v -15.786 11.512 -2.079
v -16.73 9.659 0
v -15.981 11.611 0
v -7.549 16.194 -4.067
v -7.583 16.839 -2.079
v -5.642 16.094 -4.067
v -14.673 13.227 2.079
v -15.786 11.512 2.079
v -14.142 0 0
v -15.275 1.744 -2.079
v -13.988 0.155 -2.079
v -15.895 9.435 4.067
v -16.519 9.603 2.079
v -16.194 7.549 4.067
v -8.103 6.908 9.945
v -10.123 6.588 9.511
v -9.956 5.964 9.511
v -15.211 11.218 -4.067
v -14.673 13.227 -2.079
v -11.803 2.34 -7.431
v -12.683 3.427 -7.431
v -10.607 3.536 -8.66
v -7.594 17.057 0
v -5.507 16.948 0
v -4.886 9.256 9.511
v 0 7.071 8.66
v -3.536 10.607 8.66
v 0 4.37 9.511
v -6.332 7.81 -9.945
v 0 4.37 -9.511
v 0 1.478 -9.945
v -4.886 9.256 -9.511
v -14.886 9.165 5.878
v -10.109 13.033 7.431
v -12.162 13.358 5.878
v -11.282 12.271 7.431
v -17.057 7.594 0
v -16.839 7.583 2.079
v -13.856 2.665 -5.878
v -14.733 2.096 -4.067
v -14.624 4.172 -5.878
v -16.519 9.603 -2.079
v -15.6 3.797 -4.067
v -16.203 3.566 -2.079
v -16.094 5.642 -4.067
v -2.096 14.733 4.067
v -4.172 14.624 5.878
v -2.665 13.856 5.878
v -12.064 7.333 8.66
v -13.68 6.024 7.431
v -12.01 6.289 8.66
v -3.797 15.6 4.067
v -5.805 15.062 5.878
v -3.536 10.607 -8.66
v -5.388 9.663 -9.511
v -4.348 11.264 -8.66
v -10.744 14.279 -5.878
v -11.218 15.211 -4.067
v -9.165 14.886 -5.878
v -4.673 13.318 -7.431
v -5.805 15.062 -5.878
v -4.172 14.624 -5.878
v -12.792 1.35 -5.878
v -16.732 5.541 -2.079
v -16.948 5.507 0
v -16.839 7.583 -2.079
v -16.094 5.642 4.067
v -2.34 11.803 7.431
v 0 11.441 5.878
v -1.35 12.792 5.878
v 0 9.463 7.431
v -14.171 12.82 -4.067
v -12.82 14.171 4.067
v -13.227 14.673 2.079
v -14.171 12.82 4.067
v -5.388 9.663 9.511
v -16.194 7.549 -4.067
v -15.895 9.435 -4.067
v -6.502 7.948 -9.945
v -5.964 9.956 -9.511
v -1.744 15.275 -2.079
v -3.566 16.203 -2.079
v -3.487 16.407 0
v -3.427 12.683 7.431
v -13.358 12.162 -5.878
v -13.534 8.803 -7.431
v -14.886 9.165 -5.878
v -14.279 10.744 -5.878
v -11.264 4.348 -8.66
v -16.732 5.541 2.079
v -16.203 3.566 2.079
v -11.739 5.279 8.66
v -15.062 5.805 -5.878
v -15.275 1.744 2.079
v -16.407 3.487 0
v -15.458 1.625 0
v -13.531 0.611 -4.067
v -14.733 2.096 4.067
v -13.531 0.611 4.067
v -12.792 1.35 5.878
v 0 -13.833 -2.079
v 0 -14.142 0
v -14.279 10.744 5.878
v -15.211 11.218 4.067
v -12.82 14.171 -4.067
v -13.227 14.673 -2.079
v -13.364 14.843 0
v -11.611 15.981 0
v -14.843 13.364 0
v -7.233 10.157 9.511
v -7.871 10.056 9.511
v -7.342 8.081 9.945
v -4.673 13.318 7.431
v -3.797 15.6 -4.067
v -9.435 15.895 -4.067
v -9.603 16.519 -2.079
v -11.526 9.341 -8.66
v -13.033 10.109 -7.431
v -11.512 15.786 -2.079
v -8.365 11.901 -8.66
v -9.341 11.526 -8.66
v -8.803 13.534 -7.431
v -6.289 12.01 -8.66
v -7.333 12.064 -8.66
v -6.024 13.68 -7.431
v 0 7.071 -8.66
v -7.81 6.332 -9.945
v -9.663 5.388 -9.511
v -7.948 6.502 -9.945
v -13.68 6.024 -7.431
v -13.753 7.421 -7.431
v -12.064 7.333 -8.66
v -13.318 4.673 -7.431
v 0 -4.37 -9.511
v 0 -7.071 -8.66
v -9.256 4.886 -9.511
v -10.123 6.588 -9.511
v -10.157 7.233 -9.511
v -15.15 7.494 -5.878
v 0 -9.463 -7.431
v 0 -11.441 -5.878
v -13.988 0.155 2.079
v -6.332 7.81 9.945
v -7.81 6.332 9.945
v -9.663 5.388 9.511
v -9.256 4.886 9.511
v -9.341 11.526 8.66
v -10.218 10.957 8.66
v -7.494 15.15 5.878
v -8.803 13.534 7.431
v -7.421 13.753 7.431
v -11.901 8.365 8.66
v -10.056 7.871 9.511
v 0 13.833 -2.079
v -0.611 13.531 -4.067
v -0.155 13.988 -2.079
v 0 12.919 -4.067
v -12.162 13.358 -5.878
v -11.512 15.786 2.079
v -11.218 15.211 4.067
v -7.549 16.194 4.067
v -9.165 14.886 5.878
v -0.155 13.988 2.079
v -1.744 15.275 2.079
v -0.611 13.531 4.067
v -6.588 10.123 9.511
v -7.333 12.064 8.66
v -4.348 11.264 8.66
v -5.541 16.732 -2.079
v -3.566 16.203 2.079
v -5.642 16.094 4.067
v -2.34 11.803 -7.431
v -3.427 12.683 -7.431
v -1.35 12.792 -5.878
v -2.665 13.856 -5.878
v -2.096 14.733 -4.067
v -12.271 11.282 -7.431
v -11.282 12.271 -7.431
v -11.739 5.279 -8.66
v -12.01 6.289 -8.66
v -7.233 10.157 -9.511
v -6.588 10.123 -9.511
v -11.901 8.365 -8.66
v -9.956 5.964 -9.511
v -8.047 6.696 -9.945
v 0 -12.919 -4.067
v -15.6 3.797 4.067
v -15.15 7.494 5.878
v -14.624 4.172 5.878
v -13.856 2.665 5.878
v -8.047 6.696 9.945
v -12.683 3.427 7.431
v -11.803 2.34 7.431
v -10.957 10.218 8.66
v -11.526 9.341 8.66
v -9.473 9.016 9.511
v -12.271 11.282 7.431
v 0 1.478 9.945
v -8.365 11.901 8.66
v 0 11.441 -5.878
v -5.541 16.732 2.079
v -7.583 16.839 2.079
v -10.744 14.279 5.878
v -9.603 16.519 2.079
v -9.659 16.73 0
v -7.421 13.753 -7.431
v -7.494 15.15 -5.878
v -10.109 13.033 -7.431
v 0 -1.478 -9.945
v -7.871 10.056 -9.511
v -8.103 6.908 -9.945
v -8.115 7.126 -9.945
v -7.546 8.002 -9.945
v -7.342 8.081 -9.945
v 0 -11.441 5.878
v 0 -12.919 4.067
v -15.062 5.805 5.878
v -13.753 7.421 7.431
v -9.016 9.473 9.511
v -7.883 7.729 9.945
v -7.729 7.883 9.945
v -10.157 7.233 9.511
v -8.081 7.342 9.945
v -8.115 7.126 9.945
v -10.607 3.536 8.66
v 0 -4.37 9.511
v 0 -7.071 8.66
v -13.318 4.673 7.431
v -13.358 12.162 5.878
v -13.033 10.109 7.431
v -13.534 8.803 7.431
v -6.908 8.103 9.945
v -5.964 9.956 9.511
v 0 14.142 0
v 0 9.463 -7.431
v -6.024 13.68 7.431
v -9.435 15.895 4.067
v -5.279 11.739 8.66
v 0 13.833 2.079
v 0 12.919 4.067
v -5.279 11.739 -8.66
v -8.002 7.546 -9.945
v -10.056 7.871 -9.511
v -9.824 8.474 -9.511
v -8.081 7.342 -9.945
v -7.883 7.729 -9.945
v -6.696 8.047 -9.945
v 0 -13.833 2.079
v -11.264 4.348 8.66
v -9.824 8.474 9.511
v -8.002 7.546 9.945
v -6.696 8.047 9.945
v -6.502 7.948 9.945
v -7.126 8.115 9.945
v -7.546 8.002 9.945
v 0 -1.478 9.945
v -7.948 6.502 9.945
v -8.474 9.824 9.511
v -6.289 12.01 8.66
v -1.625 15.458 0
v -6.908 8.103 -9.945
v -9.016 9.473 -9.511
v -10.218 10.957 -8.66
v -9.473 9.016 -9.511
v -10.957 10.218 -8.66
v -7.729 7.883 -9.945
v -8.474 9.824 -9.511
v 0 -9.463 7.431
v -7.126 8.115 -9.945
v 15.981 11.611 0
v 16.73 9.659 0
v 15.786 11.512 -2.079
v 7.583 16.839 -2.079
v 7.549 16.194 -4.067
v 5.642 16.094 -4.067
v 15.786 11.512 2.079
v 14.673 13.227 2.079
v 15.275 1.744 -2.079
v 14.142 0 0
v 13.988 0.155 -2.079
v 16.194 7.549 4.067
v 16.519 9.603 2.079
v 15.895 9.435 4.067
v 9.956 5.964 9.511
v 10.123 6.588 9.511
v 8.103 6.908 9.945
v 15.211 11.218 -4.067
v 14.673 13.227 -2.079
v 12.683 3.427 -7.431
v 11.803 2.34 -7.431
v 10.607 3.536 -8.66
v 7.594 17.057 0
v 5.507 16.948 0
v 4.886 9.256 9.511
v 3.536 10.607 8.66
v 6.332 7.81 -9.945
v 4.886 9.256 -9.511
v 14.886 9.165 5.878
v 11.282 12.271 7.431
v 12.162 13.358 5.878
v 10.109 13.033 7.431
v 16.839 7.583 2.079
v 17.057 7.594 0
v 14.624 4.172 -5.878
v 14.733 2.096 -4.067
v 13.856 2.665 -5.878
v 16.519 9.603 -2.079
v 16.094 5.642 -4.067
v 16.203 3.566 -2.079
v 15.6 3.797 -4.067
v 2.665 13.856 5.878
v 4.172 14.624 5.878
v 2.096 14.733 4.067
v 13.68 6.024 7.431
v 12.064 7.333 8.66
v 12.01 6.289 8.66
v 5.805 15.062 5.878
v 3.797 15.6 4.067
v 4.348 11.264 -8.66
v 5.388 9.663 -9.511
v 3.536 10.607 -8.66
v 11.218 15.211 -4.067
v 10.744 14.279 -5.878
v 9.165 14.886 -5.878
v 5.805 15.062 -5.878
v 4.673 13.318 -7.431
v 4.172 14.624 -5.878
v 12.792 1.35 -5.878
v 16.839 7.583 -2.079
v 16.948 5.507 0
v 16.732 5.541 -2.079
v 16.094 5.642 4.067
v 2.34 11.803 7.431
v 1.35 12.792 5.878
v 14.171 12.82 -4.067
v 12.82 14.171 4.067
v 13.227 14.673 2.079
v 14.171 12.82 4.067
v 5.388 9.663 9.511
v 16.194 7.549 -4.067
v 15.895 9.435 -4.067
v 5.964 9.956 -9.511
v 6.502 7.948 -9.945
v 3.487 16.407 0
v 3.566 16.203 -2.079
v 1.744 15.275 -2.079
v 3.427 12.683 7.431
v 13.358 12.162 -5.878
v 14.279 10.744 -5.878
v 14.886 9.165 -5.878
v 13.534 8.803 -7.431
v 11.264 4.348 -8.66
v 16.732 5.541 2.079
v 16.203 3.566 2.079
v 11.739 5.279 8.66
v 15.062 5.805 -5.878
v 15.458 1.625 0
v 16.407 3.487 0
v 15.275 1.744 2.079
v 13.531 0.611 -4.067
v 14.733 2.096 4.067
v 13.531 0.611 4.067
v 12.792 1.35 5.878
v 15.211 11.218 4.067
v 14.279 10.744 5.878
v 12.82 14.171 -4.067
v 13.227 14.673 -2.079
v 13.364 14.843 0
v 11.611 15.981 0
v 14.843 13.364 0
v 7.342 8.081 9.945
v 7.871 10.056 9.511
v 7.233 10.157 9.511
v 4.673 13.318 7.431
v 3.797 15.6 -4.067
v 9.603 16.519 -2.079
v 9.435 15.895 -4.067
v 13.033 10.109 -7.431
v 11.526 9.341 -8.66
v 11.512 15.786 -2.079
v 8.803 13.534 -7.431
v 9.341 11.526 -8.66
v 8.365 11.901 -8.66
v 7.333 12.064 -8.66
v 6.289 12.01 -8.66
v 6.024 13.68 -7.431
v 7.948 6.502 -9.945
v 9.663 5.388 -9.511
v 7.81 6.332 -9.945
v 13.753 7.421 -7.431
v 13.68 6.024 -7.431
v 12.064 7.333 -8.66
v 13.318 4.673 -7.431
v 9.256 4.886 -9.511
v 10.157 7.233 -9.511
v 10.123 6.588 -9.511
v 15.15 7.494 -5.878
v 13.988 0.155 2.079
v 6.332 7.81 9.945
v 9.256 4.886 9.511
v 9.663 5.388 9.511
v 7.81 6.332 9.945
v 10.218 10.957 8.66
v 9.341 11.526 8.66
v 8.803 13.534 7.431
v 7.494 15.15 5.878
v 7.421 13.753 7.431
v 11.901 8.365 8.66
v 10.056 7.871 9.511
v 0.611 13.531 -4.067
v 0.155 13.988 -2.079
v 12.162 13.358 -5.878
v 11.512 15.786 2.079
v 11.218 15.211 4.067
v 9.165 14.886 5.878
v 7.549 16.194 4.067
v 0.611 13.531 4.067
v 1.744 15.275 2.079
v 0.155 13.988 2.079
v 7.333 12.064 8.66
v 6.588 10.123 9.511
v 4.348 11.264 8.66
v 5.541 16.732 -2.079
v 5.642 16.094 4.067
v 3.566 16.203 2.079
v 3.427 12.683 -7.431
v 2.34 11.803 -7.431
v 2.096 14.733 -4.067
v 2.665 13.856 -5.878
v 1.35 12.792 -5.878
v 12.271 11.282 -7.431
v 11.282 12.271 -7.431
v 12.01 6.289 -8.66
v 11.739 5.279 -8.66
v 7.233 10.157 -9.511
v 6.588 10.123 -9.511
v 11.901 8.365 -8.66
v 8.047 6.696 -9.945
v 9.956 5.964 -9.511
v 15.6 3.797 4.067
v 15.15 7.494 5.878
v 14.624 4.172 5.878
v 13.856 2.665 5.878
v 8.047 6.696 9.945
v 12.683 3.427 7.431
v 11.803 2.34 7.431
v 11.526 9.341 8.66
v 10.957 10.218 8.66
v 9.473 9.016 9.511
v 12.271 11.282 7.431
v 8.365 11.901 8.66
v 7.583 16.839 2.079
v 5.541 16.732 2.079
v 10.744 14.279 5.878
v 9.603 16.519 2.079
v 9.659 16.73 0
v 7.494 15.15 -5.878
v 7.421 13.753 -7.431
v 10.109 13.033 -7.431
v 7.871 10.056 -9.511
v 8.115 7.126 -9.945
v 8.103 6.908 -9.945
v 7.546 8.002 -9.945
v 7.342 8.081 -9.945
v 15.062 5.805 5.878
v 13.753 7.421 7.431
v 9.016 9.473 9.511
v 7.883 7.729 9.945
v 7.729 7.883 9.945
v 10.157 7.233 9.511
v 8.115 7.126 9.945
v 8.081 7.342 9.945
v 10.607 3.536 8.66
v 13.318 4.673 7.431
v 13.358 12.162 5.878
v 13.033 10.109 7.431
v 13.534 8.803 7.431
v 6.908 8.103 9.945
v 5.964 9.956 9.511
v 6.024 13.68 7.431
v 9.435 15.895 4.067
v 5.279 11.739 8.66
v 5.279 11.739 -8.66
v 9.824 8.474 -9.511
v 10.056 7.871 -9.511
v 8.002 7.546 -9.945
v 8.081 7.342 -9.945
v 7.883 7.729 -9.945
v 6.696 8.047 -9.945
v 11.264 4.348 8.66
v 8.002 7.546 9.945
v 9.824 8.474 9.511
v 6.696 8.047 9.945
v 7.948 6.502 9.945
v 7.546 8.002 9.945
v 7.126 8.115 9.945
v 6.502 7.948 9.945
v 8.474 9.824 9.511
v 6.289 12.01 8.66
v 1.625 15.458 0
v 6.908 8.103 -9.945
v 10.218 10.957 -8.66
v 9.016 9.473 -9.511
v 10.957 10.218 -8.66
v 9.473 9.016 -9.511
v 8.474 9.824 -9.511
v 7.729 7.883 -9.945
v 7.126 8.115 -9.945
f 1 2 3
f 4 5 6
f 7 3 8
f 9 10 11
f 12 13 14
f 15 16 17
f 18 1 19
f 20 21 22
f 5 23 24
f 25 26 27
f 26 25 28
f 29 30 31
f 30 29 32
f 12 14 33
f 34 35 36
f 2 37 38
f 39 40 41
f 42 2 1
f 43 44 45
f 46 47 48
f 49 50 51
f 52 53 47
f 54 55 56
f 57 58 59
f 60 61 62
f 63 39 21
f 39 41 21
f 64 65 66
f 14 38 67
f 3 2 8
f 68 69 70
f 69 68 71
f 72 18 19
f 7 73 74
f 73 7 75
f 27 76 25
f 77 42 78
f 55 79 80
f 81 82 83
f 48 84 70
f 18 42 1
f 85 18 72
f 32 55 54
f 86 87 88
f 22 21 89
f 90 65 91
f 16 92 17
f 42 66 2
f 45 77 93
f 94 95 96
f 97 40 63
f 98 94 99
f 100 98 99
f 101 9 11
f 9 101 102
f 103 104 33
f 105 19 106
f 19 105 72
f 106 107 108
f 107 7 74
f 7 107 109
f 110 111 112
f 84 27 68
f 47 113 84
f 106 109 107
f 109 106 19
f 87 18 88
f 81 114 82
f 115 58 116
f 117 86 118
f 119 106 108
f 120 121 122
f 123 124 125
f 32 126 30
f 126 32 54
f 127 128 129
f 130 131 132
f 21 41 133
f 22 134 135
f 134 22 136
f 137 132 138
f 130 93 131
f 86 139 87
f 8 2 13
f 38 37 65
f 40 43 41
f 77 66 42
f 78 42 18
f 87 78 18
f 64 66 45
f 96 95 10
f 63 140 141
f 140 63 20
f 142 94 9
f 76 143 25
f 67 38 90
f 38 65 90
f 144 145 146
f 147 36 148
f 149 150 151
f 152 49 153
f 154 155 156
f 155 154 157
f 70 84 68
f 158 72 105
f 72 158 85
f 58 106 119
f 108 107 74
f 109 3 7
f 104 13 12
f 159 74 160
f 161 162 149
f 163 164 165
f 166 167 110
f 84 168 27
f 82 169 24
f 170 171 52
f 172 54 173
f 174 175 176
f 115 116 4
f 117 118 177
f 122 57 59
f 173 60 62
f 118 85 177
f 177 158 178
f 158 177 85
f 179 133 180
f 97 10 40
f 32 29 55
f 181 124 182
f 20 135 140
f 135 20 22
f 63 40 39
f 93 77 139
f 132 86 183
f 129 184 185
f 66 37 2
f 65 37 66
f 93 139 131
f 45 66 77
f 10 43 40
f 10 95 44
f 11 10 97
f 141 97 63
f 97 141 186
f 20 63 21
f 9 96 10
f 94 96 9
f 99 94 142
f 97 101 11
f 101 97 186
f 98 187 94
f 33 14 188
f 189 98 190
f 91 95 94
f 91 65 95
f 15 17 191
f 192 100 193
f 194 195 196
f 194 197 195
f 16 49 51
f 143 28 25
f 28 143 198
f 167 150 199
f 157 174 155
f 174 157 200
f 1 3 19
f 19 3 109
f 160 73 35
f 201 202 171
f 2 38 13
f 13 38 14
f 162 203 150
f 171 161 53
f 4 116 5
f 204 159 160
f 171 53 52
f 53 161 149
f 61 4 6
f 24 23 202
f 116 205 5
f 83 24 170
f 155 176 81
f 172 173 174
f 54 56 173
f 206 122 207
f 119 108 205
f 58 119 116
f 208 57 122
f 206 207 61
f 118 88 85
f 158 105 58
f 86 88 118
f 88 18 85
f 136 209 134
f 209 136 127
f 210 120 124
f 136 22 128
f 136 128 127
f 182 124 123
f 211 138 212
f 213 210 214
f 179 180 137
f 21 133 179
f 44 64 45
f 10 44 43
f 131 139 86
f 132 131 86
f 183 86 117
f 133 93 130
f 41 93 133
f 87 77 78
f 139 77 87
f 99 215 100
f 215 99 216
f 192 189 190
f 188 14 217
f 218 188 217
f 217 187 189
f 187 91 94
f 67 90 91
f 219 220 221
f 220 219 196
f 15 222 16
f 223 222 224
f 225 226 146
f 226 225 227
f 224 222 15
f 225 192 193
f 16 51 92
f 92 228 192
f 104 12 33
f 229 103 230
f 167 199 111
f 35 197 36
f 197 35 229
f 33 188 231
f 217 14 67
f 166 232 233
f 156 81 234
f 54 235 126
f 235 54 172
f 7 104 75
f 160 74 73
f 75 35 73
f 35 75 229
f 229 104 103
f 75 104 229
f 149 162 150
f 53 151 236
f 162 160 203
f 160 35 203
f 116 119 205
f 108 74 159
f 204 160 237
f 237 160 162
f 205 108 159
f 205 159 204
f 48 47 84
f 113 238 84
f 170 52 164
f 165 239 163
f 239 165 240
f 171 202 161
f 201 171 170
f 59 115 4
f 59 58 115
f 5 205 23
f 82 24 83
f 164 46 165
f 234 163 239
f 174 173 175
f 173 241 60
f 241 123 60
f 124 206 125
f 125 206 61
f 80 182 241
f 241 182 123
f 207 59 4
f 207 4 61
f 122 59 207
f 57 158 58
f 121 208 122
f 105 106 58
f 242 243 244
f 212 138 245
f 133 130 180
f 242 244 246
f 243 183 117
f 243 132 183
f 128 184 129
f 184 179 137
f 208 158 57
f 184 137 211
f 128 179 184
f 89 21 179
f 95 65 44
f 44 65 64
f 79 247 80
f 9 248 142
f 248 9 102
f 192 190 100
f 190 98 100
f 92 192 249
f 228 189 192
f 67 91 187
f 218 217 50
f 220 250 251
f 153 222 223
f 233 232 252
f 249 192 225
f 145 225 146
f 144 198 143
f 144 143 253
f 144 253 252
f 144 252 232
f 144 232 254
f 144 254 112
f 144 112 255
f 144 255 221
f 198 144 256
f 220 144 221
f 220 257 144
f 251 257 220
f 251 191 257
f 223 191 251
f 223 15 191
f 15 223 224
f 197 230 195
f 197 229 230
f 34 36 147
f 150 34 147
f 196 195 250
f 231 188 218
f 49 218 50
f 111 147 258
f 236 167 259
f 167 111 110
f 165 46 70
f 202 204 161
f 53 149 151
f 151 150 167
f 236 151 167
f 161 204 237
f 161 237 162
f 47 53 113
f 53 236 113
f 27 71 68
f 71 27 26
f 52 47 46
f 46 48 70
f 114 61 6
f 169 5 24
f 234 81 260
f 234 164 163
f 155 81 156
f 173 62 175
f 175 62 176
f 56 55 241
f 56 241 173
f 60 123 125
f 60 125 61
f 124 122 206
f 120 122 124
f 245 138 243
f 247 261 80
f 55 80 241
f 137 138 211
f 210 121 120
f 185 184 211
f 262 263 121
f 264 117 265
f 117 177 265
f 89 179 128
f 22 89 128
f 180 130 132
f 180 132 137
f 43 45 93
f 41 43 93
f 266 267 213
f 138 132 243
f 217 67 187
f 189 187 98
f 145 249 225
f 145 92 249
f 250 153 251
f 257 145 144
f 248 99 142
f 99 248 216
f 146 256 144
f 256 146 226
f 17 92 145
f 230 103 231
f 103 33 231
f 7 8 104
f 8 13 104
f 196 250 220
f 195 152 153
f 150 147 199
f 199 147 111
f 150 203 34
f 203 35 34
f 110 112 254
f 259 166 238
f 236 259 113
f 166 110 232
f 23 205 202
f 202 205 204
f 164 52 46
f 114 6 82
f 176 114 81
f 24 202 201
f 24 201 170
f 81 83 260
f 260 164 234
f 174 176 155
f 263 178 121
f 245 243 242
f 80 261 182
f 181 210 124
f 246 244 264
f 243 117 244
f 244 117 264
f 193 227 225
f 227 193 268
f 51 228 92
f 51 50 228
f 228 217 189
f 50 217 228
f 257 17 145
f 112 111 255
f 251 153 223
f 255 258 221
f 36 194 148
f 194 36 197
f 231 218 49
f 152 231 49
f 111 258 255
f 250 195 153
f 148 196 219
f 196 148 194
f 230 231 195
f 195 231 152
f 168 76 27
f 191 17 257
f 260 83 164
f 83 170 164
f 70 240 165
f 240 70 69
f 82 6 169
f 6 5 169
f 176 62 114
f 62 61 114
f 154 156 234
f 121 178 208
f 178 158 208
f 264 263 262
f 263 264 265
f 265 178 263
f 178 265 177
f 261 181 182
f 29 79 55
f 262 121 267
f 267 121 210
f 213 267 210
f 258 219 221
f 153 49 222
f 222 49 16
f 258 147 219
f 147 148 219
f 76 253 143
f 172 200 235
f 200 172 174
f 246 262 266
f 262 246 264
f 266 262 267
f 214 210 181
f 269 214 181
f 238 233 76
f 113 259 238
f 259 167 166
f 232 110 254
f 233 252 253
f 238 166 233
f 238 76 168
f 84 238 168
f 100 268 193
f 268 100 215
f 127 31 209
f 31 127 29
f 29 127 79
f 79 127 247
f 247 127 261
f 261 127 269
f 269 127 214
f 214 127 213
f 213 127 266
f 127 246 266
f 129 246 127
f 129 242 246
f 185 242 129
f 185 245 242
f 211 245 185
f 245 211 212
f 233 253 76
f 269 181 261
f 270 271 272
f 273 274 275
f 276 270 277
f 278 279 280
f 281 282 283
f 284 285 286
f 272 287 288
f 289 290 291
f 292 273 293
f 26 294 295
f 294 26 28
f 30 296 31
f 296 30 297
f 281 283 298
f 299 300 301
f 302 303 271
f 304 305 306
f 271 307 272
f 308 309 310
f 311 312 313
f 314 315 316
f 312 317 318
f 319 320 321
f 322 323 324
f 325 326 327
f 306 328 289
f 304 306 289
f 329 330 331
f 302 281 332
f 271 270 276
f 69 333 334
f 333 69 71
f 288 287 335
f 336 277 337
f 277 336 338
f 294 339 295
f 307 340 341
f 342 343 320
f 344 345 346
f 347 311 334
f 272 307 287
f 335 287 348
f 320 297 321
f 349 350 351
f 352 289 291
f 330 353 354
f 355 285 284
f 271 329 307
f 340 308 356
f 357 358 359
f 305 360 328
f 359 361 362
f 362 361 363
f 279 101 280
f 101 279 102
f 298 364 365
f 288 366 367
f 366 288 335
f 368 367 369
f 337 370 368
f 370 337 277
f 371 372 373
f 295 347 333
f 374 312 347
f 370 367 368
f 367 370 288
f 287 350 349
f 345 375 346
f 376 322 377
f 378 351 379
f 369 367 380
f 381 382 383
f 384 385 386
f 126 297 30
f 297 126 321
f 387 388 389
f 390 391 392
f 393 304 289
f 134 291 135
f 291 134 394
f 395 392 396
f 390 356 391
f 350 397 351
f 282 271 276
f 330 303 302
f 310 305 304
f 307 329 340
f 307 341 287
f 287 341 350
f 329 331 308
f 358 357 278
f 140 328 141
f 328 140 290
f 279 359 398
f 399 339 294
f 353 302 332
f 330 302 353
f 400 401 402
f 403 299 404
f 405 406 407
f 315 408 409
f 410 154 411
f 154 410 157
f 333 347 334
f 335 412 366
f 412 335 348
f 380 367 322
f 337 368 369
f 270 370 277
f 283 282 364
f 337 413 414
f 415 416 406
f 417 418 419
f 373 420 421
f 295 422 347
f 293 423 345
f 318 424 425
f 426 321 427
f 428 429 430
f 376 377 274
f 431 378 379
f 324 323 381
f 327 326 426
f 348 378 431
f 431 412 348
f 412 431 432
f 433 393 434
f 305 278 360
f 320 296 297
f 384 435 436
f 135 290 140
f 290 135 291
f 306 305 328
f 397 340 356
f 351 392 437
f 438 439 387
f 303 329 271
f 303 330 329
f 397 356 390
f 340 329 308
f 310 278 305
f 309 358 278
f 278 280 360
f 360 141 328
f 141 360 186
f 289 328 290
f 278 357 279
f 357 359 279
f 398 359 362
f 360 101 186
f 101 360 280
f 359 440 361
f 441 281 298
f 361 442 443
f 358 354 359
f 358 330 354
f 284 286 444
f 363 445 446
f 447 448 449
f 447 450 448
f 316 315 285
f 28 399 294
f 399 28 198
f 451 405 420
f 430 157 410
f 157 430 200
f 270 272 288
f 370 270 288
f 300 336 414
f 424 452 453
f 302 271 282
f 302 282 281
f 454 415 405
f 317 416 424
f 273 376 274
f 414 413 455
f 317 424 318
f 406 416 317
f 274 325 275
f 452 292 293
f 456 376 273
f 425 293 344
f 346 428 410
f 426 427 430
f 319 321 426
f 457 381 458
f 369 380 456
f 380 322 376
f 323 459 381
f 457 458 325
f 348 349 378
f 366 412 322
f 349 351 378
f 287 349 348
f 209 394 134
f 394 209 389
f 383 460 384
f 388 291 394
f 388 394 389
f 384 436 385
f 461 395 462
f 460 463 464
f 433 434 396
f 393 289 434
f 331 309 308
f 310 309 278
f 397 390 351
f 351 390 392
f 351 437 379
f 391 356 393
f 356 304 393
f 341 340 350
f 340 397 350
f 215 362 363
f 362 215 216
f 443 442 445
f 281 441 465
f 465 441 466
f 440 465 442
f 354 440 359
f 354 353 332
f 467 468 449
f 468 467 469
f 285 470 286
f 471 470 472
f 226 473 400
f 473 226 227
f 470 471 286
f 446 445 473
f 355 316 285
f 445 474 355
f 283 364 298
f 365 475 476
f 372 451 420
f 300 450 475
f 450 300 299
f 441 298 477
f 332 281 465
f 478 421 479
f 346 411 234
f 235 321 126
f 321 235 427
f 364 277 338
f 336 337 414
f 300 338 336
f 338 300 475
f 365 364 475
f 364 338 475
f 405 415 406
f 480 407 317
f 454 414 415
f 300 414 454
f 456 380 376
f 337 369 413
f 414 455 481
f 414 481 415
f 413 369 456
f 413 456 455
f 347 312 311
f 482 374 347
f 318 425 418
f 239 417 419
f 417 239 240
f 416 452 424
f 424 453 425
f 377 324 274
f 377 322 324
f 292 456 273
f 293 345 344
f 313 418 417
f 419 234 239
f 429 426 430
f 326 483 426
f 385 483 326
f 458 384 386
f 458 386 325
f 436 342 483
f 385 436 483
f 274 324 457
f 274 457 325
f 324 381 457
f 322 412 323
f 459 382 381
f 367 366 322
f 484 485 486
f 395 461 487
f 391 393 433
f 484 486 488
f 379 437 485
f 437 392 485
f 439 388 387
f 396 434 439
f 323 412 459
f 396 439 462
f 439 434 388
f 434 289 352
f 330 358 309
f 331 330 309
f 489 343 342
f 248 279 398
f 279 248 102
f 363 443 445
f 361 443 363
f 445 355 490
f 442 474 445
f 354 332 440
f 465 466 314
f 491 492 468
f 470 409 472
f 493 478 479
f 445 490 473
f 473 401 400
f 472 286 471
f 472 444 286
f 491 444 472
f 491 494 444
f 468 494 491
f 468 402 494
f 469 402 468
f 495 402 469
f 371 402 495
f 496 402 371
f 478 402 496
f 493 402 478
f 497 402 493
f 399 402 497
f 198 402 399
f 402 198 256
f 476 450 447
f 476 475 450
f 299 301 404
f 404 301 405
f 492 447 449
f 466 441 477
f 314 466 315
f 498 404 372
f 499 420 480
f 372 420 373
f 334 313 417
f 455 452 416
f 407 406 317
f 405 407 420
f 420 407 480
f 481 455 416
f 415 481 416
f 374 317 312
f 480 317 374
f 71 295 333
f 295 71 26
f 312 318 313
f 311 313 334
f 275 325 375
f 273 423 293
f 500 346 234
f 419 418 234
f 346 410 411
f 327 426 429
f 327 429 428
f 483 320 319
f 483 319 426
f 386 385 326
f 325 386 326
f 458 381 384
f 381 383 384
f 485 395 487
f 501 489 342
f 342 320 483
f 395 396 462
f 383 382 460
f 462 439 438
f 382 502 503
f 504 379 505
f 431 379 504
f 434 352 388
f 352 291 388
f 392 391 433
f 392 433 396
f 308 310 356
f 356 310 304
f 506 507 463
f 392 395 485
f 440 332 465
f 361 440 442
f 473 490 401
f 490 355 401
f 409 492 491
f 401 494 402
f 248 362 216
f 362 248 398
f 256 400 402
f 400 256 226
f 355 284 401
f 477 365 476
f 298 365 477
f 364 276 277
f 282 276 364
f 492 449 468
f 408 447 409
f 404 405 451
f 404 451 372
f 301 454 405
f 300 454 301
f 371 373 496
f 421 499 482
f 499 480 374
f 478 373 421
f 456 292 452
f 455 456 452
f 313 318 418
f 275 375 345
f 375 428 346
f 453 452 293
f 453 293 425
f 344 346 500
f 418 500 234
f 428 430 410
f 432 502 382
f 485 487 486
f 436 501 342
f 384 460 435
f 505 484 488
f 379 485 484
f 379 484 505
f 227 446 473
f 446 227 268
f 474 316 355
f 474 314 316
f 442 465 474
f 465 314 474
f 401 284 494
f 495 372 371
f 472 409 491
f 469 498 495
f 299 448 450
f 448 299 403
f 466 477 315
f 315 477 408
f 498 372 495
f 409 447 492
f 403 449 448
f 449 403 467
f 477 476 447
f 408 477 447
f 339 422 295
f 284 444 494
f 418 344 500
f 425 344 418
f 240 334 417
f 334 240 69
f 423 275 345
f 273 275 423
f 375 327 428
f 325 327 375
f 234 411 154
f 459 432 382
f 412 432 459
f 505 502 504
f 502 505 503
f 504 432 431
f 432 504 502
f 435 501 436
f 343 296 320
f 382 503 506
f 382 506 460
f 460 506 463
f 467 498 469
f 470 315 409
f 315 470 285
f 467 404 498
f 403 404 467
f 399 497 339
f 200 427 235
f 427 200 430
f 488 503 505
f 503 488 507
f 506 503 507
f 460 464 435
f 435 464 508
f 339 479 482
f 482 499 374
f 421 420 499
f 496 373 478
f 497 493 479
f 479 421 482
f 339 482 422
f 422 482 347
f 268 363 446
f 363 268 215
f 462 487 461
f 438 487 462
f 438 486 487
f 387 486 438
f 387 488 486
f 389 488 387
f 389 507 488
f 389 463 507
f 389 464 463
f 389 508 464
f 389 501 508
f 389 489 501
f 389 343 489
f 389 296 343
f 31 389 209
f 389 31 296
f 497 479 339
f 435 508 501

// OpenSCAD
/*
CORAÇÃO EM 3D

ALUNA: Cryslene Coêlho de Oliveira
MATRÍCULA: 201533840036

*/
module coracao()
color("red"){
difference(){
    hull(){
        translate([0,10,0])
        sphere(d=20);
        translate([0,-10,0])
        sphere(d=20);
    }
    translate([-40,-40,125])
    cube([80,80,20]);
    translate([-40,-40,-145])
    cube([80,80,20]);
    rotate([0,0,45])
    translate([-20,-40,-250])
    cube([40,40,500]);
}}
rotate([0,0,45])
coracao();
mirror([1,0,0])
rotate([0,0,45])
coracao();
